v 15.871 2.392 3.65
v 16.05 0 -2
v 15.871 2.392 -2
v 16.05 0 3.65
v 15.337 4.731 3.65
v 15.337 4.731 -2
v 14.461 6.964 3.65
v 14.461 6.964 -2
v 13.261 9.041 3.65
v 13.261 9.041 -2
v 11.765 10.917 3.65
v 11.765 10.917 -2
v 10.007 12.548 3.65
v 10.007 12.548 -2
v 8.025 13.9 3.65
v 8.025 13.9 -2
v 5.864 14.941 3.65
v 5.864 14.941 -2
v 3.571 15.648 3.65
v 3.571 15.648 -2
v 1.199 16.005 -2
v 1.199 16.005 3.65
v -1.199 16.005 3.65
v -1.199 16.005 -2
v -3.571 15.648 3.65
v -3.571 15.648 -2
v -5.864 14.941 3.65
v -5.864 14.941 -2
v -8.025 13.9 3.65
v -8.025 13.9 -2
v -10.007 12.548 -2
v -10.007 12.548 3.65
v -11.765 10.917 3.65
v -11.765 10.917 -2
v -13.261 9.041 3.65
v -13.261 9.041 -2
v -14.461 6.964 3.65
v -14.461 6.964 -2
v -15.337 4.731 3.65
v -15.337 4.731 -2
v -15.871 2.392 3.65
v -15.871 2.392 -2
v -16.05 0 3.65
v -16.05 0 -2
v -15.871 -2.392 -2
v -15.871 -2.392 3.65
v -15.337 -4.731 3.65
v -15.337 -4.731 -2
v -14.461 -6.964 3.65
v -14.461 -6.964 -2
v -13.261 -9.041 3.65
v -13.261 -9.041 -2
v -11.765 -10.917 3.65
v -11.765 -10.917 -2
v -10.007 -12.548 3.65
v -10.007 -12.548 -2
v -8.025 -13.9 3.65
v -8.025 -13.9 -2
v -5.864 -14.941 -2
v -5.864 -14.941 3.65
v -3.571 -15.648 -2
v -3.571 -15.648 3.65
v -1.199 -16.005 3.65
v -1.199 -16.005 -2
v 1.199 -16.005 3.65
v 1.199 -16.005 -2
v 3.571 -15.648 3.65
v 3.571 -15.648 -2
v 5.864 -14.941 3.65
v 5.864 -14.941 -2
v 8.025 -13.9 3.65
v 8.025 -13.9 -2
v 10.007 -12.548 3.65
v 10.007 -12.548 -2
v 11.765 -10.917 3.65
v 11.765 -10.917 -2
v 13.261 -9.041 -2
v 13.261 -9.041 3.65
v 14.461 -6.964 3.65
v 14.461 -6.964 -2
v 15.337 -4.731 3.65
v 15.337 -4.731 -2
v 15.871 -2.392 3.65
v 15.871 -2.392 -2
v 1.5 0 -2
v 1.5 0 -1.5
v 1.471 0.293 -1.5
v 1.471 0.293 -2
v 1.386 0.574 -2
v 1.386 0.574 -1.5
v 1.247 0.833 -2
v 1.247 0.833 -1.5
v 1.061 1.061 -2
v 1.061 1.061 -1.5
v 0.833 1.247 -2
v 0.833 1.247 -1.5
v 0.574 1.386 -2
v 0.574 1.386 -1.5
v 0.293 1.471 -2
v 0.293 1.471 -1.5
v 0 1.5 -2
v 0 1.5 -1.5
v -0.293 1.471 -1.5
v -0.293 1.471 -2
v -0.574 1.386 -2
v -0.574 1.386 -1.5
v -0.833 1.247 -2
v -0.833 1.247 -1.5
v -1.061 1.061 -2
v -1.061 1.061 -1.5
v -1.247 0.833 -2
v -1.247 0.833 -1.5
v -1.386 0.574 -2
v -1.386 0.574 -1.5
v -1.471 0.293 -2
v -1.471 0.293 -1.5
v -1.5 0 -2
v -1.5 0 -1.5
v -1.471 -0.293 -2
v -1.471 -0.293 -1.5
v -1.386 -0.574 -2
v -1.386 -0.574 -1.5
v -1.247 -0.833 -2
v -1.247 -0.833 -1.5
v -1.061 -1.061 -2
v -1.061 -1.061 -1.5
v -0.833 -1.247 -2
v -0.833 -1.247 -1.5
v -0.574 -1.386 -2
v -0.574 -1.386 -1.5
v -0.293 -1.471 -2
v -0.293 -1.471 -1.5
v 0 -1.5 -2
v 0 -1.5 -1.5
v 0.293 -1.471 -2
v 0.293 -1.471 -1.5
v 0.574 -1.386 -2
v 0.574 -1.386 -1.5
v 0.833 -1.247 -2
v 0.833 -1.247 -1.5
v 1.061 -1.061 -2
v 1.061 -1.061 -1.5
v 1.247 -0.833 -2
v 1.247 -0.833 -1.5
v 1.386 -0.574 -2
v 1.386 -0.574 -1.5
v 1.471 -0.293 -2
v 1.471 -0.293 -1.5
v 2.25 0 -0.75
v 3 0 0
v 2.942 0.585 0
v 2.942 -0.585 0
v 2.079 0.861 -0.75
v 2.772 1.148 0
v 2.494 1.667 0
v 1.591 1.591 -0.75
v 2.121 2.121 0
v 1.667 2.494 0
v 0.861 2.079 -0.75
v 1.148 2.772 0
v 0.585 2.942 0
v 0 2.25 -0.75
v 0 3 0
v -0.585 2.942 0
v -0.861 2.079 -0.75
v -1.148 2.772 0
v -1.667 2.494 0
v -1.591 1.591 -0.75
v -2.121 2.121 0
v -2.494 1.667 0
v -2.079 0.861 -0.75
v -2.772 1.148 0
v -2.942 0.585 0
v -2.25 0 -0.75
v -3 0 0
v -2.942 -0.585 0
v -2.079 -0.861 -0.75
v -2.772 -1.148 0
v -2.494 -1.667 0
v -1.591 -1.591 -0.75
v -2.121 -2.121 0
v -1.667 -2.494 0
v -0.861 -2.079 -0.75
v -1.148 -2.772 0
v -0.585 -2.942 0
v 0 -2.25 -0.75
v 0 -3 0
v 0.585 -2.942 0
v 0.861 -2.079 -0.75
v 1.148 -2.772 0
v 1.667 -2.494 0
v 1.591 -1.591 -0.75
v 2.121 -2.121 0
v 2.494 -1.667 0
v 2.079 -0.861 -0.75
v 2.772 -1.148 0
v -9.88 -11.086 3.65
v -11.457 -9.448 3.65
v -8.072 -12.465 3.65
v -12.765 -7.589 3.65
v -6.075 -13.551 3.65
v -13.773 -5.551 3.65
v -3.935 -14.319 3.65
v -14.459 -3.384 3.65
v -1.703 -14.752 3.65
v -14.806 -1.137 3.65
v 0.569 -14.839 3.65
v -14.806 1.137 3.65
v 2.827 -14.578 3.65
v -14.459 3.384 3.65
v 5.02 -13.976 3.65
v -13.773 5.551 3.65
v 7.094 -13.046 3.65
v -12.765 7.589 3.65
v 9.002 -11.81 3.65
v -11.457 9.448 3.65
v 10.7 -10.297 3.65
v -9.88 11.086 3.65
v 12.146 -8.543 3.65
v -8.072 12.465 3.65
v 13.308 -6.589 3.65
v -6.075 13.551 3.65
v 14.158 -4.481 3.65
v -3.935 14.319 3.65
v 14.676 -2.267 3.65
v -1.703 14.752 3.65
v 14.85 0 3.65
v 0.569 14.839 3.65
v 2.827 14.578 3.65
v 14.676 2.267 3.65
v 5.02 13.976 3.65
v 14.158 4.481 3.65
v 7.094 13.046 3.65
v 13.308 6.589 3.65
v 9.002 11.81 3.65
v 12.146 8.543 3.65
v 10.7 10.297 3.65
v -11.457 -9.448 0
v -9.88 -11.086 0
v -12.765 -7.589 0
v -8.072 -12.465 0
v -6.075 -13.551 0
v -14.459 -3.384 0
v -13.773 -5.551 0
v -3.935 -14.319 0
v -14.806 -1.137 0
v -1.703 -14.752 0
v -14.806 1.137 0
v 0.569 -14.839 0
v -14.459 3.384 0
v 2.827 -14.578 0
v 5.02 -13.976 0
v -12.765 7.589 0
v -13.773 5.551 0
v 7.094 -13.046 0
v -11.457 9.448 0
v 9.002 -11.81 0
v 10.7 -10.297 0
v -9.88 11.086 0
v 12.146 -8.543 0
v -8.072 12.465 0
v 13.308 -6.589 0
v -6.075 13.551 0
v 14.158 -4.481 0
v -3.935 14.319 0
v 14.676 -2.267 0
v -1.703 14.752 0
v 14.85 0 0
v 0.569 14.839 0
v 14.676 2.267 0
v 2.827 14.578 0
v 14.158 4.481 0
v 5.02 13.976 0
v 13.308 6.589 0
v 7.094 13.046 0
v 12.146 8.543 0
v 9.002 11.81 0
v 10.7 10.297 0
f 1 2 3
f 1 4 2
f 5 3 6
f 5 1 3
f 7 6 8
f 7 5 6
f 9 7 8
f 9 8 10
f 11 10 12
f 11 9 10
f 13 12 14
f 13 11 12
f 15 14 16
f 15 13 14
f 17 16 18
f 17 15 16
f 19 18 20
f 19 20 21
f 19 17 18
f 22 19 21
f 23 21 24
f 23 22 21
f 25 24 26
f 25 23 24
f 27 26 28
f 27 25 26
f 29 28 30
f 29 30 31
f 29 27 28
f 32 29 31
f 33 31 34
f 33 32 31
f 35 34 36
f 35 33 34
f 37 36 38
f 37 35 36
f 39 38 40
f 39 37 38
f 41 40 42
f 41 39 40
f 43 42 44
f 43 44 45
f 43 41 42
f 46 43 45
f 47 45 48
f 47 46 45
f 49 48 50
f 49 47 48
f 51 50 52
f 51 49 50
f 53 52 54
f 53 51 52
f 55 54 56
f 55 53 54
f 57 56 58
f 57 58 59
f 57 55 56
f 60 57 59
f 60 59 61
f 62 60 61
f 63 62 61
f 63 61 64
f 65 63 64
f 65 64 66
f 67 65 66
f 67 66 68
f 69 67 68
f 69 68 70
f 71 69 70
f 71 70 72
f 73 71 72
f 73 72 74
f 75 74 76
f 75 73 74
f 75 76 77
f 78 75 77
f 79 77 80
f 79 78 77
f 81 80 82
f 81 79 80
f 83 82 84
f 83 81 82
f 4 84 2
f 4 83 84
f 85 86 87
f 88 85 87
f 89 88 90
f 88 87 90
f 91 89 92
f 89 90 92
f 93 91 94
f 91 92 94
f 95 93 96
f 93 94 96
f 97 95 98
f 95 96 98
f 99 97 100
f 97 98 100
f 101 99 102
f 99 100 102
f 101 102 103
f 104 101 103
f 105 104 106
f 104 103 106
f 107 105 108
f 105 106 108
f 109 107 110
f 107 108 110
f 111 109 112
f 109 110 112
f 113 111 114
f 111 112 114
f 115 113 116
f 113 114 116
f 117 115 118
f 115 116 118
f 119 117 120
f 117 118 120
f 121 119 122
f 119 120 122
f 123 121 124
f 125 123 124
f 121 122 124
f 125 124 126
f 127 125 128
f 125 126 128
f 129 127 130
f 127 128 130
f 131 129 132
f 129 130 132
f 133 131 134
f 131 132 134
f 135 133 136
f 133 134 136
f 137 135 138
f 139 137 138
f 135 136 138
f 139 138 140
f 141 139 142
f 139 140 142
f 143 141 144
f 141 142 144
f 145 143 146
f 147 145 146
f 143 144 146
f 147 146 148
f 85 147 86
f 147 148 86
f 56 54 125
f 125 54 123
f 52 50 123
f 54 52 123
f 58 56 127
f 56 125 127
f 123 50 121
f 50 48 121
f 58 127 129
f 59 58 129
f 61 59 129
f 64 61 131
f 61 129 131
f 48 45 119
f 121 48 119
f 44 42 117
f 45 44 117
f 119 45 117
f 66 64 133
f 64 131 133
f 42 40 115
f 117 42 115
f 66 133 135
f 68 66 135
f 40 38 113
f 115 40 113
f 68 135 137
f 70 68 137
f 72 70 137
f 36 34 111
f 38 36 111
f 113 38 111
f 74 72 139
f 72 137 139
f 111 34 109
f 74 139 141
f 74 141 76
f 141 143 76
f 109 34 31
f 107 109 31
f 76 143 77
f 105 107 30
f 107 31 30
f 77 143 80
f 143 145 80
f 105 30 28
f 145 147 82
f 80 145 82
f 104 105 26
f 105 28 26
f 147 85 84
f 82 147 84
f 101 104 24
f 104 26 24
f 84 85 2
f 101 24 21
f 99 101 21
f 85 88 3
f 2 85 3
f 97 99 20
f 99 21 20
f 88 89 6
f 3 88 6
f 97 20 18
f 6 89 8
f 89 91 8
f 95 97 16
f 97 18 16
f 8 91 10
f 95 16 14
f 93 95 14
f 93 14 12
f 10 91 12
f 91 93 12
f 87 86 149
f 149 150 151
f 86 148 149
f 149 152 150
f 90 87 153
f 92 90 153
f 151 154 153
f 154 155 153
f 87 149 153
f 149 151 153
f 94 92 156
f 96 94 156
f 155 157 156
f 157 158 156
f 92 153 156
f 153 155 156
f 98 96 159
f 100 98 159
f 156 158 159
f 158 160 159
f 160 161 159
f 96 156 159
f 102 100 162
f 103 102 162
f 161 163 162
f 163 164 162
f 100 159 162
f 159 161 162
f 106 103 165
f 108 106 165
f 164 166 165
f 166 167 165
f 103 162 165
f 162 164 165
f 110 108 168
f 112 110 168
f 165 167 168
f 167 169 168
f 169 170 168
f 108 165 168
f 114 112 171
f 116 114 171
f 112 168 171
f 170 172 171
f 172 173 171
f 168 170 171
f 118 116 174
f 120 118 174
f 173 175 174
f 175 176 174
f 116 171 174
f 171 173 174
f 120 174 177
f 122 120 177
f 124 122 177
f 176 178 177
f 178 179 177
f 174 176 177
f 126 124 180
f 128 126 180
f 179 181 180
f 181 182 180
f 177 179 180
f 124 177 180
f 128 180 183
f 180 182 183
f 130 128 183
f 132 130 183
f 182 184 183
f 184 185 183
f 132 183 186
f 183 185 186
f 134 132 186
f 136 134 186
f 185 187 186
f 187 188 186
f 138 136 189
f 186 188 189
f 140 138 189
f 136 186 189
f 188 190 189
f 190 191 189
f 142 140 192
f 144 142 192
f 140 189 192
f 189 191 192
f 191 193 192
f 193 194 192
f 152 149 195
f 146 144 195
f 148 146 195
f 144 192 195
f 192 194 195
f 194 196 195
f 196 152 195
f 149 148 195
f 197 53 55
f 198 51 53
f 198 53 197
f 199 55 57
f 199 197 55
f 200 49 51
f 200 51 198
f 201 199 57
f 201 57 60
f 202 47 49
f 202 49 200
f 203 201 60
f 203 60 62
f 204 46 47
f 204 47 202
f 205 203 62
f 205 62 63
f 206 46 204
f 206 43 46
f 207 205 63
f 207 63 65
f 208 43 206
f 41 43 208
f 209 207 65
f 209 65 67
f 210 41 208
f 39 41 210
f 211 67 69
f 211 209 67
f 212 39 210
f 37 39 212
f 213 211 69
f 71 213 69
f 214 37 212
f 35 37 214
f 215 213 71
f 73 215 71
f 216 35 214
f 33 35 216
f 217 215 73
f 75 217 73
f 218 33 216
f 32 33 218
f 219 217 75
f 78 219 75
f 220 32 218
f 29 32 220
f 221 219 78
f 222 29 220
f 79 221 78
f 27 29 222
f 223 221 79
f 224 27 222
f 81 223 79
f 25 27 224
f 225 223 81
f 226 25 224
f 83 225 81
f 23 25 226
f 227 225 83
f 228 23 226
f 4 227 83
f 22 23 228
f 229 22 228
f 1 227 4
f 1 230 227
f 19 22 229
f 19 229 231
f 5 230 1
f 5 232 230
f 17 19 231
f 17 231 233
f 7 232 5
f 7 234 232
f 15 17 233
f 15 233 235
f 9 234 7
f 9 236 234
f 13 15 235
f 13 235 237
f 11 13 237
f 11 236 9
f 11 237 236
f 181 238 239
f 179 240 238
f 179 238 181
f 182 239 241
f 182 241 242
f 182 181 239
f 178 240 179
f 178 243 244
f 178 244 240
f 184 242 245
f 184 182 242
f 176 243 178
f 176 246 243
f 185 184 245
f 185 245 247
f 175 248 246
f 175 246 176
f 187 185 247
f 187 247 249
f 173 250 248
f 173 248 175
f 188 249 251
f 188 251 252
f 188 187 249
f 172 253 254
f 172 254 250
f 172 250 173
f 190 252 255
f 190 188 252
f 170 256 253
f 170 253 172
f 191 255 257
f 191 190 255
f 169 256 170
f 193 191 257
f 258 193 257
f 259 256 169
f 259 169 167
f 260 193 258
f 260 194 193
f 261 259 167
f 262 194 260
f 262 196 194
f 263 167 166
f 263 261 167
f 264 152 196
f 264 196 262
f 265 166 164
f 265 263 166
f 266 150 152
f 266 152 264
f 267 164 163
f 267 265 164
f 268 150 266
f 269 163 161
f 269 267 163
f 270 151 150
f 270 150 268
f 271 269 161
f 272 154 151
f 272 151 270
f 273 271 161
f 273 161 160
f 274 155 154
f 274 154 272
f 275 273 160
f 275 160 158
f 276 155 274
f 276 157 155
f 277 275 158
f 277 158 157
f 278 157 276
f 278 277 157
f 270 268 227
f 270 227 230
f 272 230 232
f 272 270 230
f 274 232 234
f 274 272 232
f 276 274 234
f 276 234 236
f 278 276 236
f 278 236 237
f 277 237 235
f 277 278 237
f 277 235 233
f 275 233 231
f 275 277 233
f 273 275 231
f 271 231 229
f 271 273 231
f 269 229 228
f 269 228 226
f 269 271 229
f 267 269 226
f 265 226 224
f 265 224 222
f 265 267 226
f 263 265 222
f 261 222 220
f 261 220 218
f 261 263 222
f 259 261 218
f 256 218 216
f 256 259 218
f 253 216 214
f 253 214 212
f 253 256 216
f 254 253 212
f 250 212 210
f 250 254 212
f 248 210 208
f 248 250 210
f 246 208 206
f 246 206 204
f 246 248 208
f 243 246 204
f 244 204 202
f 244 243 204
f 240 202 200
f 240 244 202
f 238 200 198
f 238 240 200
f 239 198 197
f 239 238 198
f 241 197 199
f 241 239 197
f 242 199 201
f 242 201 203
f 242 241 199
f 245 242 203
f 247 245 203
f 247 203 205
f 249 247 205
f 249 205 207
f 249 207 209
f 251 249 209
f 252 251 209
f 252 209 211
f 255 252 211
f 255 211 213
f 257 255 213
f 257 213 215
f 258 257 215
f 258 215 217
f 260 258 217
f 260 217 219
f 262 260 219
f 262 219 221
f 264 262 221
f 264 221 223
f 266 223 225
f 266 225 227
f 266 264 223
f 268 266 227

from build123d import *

# Parameters (mm, degrees)
F0_R     = 16.05
F0_R_2   = 14.85
F0_R_3   = 1.5
F1_DEPTH = 2
F2_DEPTH = 3.65
F3_SIZE  = 1.5


with BuildPart() as f1:
    # F0 (on Top) → F1 (new body)
    with BuildSketch(Plane.XY):
        Circle(F0_R)
        Circle(F0_R_2, mode=Mode.SUBTRACT)
        Circle(F0_R_2)
        Circle(F0_R_3, mode=Mode.SUBTRACT)
    extrude(amount=-F1_DEPTH)

    # F0 (on Top) → F2 (join)
    with BuildSketch(Plane.XY):
        Circle(F0_R)
        Circle(F0_R_2, mode=Mode.SUBTRACT)
    extrude(amount=F2_DEPTH)

    # F3
    f3_edges = [f1.edges().sort_by_distance(p)[0] for p in [
        (-1.5, 0, 0),
    ]]
    chamfer(f3_edges, length=F3_SIZE)


solid = f1.part
